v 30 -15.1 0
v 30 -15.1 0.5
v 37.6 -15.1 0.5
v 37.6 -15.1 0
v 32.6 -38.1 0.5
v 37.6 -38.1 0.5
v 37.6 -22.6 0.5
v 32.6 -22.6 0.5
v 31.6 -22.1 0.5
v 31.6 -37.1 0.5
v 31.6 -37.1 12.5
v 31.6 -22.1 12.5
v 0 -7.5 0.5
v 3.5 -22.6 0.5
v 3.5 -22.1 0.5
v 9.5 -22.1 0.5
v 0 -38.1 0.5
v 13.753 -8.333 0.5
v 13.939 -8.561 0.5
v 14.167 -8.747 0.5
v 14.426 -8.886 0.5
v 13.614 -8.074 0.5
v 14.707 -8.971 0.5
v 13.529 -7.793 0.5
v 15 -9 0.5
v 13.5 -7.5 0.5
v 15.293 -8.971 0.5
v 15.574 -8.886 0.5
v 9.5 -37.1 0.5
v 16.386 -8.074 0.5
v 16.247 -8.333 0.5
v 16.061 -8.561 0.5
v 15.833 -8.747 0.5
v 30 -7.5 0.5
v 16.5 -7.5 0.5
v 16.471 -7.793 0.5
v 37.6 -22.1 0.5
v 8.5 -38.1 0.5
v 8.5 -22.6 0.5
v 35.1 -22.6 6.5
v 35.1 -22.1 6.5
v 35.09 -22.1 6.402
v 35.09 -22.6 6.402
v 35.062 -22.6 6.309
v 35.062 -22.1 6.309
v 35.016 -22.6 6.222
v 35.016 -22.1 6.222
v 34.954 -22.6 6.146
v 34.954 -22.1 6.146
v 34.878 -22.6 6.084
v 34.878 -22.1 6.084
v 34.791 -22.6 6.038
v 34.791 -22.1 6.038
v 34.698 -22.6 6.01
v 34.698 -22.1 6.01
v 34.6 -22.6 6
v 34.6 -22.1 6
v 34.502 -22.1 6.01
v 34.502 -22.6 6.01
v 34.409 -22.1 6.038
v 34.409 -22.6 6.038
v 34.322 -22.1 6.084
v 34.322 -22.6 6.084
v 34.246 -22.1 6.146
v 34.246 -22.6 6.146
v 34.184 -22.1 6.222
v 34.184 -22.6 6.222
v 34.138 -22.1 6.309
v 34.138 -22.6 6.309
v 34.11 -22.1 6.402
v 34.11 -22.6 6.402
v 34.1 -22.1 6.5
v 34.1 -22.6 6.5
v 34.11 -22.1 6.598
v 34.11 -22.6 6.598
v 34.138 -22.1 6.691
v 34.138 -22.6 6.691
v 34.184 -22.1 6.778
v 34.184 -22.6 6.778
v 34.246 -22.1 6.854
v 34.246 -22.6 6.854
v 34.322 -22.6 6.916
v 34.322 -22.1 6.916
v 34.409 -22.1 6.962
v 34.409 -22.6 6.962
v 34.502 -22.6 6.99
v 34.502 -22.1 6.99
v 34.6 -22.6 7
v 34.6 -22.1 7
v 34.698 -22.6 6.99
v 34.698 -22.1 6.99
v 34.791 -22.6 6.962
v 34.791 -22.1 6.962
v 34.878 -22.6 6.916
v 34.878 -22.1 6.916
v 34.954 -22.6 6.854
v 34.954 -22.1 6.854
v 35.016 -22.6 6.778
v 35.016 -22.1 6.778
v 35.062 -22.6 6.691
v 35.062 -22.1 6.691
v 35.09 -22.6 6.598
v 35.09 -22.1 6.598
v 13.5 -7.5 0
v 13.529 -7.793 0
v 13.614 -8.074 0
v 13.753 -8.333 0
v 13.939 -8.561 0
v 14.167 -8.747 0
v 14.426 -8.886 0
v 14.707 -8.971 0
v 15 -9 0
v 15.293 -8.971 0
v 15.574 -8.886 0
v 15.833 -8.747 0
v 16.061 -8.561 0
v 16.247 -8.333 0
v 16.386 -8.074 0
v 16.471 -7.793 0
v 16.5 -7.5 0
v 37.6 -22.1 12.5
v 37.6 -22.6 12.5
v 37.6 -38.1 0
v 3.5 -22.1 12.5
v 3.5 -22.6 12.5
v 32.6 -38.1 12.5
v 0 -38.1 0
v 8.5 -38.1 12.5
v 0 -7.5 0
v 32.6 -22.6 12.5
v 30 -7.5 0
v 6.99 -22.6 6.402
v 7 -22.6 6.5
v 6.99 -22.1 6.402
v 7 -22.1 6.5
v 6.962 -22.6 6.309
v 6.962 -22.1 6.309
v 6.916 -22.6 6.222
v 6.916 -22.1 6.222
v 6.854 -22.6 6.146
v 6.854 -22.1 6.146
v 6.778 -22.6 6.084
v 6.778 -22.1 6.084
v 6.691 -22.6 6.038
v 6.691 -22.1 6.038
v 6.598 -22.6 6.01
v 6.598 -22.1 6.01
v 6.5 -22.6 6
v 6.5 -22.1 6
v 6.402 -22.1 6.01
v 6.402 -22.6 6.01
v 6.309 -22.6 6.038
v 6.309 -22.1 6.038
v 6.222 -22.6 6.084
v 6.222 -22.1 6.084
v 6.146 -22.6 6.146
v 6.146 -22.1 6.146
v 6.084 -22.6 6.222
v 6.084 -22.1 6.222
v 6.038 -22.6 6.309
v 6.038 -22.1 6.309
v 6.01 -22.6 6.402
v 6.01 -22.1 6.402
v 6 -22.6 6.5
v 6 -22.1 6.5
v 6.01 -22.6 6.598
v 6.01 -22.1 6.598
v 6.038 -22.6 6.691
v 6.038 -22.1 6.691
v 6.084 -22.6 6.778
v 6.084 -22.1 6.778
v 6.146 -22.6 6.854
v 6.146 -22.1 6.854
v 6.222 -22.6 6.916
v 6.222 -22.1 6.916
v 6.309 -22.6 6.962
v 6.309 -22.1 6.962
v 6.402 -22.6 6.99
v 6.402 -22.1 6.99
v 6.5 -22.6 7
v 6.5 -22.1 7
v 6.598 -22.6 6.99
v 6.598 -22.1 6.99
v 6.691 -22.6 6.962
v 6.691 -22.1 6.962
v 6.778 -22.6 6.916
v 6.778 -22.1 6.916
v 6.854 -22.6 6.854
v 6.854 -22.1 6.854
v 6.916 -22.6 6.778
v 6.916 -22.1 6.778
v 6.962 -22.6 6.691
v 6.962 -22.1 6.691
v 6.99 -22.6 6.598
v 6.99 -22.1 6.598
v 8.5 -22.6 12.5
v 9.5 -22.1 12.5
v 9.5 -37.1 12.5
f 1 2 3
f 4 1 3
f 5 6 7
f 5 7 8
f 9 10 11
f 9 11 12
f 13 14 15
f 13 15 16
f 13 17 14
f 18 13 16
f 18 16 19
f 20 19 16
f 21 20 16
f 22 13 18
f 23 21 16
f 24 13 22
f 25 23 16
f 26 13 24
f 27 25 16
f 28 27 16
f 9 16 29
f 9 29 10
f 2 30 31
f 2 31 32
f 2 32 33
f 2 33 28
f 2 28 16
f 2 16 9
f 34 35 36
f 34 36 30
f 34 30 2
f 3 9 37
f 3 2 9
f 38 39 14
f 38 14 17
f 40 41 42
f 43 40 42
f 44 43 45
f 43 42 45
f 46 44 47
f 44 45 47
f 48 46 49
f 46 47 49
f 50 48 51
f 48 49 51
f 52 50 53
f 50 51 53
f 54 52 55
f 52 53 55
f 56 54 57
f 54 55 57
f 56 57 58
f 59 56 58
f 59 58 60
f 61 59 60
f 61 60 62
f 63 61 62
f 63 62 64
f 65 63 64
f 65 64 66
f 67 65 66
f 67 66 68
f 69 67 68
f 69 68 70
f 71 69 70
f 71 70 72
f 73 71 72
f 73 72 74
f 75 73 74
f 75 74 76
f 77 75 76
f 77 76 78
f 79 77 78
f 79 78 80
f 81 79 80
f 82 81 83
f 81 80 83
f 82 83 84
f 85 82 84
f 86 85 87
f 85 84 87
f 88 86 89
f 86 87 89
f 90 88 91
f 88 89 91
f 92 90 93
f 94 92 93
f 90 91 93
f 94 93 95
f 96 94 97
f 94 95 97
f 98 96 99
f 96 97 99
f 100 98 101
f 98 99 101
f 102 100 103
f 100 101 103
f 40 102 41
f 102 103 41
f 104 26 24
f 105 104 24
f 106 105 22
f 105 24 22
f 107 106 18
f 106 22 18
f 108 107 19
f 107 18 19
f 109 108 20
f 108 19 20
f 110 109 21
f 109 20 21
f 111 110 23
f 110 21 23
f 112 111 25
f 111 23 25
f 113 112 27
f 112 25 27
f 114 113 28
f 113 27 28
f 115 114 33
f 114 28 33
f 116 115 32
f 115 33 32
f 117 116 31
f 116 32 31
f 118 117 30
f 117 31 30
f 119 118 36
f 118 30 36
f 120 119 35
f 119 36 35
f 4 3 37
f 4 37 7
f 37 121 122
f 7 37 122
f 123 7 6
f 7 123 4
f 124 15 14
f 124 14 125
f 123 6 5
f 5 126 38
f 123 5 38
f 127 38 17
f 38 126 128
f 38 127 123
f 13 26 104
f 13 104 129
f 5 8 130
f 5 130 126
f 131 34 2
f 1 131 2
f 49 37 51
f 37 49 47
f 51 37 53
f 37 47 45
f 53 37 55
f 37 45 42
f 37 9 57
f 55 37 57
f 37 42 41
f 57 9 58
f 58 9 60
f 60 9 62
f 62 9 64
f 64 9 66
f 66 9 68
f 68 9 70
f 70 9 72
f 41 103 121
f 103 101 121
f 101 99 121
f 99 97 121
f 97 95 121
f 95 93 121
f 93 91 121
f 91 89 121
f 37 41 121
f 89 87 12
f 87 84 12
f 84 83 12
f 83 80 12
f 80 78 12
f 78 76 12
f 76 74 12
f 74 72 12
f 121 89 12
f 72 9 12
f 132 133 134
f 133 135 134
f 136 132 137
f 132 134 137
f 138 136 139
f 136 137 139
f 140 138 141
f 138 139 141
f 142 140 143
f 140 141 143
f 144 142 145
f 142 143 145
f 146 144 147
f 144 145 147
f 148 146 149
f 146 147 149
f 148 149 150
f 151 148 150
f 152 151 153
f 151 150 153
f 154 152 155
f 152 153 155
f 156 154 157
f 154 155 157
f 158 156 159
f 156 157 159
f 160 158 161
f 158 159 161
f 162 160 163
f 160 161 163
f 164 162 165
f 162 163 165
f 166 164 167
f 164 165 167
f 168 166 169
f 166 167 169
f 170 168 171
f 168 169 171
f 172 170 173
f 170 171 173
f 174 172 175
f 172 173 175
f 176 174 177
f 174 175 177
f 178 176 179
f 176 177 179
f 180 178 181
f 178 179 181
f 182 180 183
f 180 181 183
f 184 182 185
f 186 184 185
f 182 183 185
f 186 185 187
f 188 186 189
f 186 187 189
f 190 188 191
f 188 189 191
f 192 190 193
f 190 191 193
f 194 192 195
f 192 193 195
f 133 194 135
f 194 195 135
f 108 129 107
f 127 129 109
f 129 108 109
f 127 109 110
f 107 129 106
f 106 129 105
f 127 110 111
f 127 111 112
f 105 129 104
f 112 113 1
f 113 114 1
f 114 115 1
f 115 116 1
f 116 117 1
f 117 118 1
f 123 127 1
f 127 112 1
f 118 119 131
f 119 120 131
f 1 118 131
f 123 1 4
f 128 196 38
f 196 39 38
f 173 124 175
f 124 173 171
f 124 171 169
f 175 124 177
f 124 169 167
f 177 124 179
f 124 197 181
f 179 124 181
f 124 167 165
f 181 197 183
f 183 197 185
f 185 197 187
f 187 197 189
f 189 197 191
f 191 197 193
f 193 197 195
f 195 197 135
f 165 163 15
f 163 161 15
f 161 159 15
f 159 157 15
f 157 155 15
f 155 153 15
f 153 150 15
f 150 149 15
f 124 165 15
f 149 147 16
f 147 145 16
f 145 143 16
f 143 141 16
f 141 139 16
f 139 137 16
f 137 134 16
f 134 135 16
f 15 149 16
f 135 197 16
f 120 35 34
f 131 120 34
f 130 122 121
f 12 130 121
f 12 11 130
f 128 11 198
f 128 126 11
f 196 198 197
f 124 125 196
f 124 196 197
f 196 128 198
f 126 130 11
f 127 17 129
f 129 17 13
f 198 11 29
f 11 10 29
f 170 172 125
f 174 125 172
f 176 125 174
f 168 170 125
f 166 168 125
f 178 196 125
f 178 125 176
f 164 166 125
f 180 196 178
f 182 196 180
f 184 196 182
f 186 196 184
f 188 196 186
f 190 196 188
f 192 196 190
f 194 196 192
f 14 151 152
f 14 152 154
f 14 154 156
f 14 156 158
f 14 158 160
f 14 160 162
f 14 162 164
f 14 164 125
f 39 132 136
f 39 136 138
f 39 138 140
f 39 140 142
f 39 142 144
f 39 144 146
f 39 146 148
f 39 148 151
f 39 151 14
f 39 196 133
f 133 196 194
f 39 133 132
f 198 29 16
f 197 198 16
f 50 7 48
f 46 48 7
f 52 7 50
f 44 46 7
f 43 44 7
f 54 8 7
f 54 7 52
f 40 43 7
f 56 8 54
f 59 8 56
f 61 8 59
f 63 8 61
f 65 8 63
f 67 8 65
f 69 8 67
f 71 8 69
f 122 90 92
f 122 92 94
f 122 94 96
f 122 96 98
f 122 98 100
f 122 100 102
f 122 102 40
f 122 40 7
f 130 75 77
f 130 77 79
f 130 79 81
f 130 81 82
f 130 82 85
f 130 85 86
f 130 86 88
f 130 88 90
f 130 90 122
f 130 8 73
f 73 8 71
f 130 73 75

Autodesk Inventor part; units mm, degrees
ref_plane "YZ Plane" through (0, 0, 0) normal (1, 0, 0) x (0, 1, 0)
ref_plane "XZ Plane" through (0, 0, 0) normal (0, 1, 0) x (-1, 0, 0)
ref_plane "XY Plane" through (0, 0, 0) normal (0, 0, 1) x (1, 0, 0)
sketch "Esboço1" plane through (0, 0, 0) normal (0, 0, 1) x (1, 0, 0)
  line L0 (0, 0) -> (30, 0)
  line L1 (30, 0) -> (30, -36.4)
  line L2 (30, -36.4) -> (0, -36.4)
  line L3 (0, -36.4) -> (0, 0)
  dimension "d0" = 30
  dimension "d1" = 36.4
extrude "Extrusão1" add sketch "Esboço1" along normal blind 0.5
sketch "Esboço2" plane through (0, 0, 0.5) normal (0, 0, 1) x (1, 0, 0)
  line L0 (30, 0) -> (0, 0) projected
  line L1 (0, 0) -> (15, 0)
  line L2 (15, 0) -> (15, -7.5)
  circle A0 centre (15, -7.5) radius 1.5
  dimension "d4" = 7.5
  dimension "d5" = 3
extrude "Extrusão2" cut sketch "Esboço2" against normal blind 0.5
sketch "Esboço4" plane through (0, 0, 0.5) normal (0, 0, 1) x (1, 0, 0)
  line L0 (0, -36.4) -> (30, -36.4) projected
  line L1 (0, -36.4) -> (30, -36.4)
  line L2 (30, -36.4) -> (30, -37.1)
  line L3 (30, -37.1) -> (0, -37.1)
  line L4 (0, -37.1) -> (0, -36.4)
  point P0 (0, 0)
  dimension "d10" = 0.7
extrude "Extrusão3" add sketch "Esboço4" against normal blind 0.5
sketch "Esboço5" plane through (0, 0, 0.5) normal (0, 0, 1) x (1, 0, 0)
  line L0 (0, 0) -> (0, -37.1) projected
  line L1 (0, -37.1) -> (4, -37.1)
  line L2 (30, -37.1) -> (0, -37.1) projected
  line L3 (30, -37.1) -> (30, 0) projected
  line L4 (30, -37.1) -> (26, -37.1)
  line L5 (30, -37.1) -> (35.5, -37.1)
  line L6 (35.5, -37.1) -> (35.5, -17.1)
  line L7 (35.5, -17.1) -> (30, -17.1)
  dimension "d13" = 4
  dimension "d14" = 4
  dimension "d15" = 5.5
  dimension "d16" = 20
extrude "Extrusão4" add sketch "Esboço5" against normal blind 0.5
sketch "Esboço6" plane through (0, 0, 0.5) normal (0, 0, 1) x (1, 0, 0)
  line L0 (35.5, -37.1) -> (0, -37.1) projected
  line L1 (0, -37.1) -> (9.5, -37.1)
  line L2 (35.5, -37.1) -> (31.6, -37.1)
  line L3 (35.5, -37.1) -> (36.5, -37.1)
  line L4 (36.5, -37.1) -> (36.5, -11.1125)
  line L5 (36.5, -11.1125) -> (35.5, -11.1125)
  line L6 (35.5, -11.1125) -> (35.5, -37.1)
  line L7 (30, -17.1) -> (30, 0) projected
  line L8 (30, -17.1) -> (30, -15.0997)
  line L9 (30, -15.0997) -> (36.5, -15.0997)
  line L10 (30, -17.1) -> (35.5, -17.1) projected
  line L11 (30, -17.1) -> (35.5, -17.1)
  line L12 (30, -15.0997) -> (36.5, -15.0997)
  point P0 (0, 0)
  dimension "d19" = 9.5
  dimension "d20" = 3.9
  dimension "d21" = 1
extrude "Extrusão5" add sketch "Esboço6" against normal blind 0.5 contours L6 L9 L4 L3 | L10 L7 L9 L6
sketch "Esboço7" plane through (0, 0, 0.5) normal (0, 0, 1) x (1, 0, 0)
  line L0 (36.5, -37.1) -> (0, -37.1) projected
  line L1 (0, -37.1) -> (9.5, -37.1)
  line L2 (36.5, -37.1) -> (31.6, -37.1)
  line L3 (31.6, -37.1) -> (31.6, -20.6)
  line L4 (9.5, -37.1) -> (9.5, -20.6)
  line L5 (8.5, -20.6) -> (8.5, -37.1)
  line L6 (32.6, -20.6) -> (32.6, -37.1)
  line L7 (31.6, -20.6) -> (31.6, -20.1)
  line L8 (31.6, -20.1) -> (32.6, -20.1)
  line L9 (32.6, -20.1) -> (32.6, -20.6375)
  line L10 (9.5, -20.6) -> (9.5, -20.1)
  line L11 (9.5, -20.1) -> (8.5, -20.1)
  line L12 (8.5, -20.1) -> (8.5, -20.8548)
  line L13 (8.5, -37.1) -> (32.6, -37.1)
  line L14 (32.6, -37.1) -> (32.6, -36.6)
  line L15 (8.5, -37.1) -> (8.5, -36.6)
  point P0 (0, 0)
  dimension "d24" = 9.5
  dimension "d25" = 4.9
  dimension "d26" = 16.5
  dimension "d27" = 1
  dimension "d28" = 1
  dimension "d29" = 0.5
  dimension "d30" = 0.5
  dimension "d31" = 0.5
extrude "Extrusão6" add sketch "Esboço7" along normal blind 12
sketch "Esboço8" plane through (0, 0, 0.5) normal (0, 0, 1) x (1, 0, 0)
  line L0 (0, 0) -> (0, -37.1) projected
  line L1 (0, -37.1) -> (36.5125, -37.1)
  line L2 (36.5125, -37.1) -> (36.5125, -38.1)
  line L3 (36.5125, -38.1) -> (0, -38.1)
  line L4 (0, -38.1) -> (0, -37.1)
extrude "Extrusão7" add sketch "Esboço8" against normal blind 0.5
sketch "Esboço9" plane through (0, 0, 0.5) normal (0, 0, 1) x (1, 0, 0)
  line L0 (8.5, -37.1) -> (9.5, -37.1) projected
  line L1 (8.5, -37.1) -> (8.5, -38.1)
  line L2 (8.5, -38.1) -> (32.6, -38.1)
  line L3 (0, -38.1) -> (36.5125, -38.1) projected
  line L4 (31.6, -37.1) -> (32.6, -37.1) projected
  line L5 (32.6, -37.1) -> (32.6, -38.1)
  line L6 (32.6165, -37.1) -> (8.5, -37.1)
  point P0 (0, 0)
extrude "Extrusão8" add sketch "Esboço9" along normal blind 12
sketch "Esboço10" plane through (0, 0, 12.5) normal (0, 0, 1) x (1, 0, 0)
  line L0 (9.5, -20.1) -> (8.5, -20.1) projected
  line L1 (9.5, -37.1) -> (9.5, -20.1) projected
  line L2 (8.5, -20.1) -> (9.5, -20.1)
  line L3 (9.5, -20.1) -> (9.5, -22.1)
  line L4 (9.5, -22.1) -> (8.5, -22.1)
  line L5 (8.5, -22.1) -> (8.5, -20.1)
  line L6 (32.6, -20.1) -> (31.6, -20.1) projected
  line L7 (32.6, -38.1) -> (32.6, -20.1) projected
  line L8 (31.6, -20.1) -> (32.6, -20.1)
  line L9 (32.6, -20.1) -> (32.6, -22.1)
  line L10 (32.6, -22.1) -> (31.6, -22.1)
  line L11 (31.6, -22.1) -> (31.6, -20.1)
  point P0 (0, 0)
  dimension "d38" = 2
extrude "Extrusão9" cut sketch "Esboço10" against normal blind 12
sketch "Esboço11" plane through (8.5, -38.1, 0.5) normal (-1, 0, 0) x (0, 0, 1)
  line L0 (12, 16) -> (0, 16) projected
  line L1 (12, 16) -> (12, 0) projected
  line L2 (0, 16) -> (12, 16)
  line L3 (12, 16) -> (12, 15.5)
  line L4 (12, 15.5) -> (0, 15.5)
  line L5 (0, 15.5) -> (0, 16)
  point P0 (-0.5, 38.1)
  dimension "d41" = 0.5
extrude "Extrusão10" add sketch "Esboço11" along normal blind 5
sketch "Esboço12" plane through (32.6, -38.1, 12.5) normal (1, 0, 0) x (0, 0, -1)
  line L0 (12, 16) -> (0, 16) projected
  line L1 (12, 15.5) -> (0, 15.5) projected
  line L2 (0, 16) -> (12, 16)
  line L3 (12, 16) -> (12, 15.5)
  line L4 (12, 15.5) -> (0, 15.5)
  line L5 (0, 15.5) -> (0, 16)
  point P0 (12.5, 38.1)
extrude "Extrusão11" add sketch "Esboço12" along normal blind 5
sketch "Esboço13" plane through (0, 0, 0.5) normal (0, 0, 1) x (1, 0, 0)
  circle A0 centre (15, -7.5) radius 1.5 projected
  line L0 (15, -7.5) -> (30, -7.5)
  line L1 (30, -15.0997) -> (30, 0) projected
  line L2 (15, -7.5) -> (0, -7.5)
  line L3 (0, -38.1) -> (0, 0) projected
  line L4 (0, 0) -> (30, 0)
  line L5 (30, 0) -> (0, 0) projected
  line L6 (30, 0) -> (30, -7.5)
  line L7 (0, -7.5) -> (0, 0)
  point P0 (13.5, -7.5)
  point P1 (16.5, -7.5)
extrude "Extrusão12" cut sketch "Esboço13" against normal blind 5 contours A0 L2 L3 L4 L1 L0
sketch "Esboço14" plane through (31.6, -22.1, 12.5) normal (0, 1, 0) x (1, 0, 0)
  line L0 (-22.1, 0) -> (-28.1, 0) projected
  line L1 (-28.1, 0) -> (-25.1, 0)
  line L2 (-25.1, 0) -> (-25.1, 6)
  line L3 (-22.1, 12) -> (-28.1, 12) projected
  line L4 (6, 12) -> (6, 0) projected
  line L5 (6, 0) -> (3, 0)
  line L6 (6, 0) -> (0, 0) projected
  line L7 (3, 0) -> (3, 6)
  circle A0 centre (-25.1, 6) radius 0.5
  circle A1 centre (3, 6) radius 0.5
  point P0 (-31.6, 12.5)
  dimension "d48" = 6
  dimension "d49" = 1
  dimension "d50" = 1
extrude "Extrusão13" cut sketch "Esboço14" against normal blind 5
sketch "Esboço15" plane through (37.6, -22.1, 0.5) normal (0, 0, -1) x (-1, 0, 0)
  line L0 (7.6, 7.0003) -> (1.1, 7.0003) projected
  line L1 (1.1, 7.0003) -> (0, 7.0003)
  line L2 (0, 7.0003) -> (0, -16)
  line L3 (1.0875, -15) -> (1.0875, -16) projected
  line L4 (0, -16) -> (1.0875, -16)
  line L5 (1.1, 7.0003) -> (1.8775, 7.0003)
  line L6 (1.8775, 7.0003) -> (1.8775, -16)
  line L7 (1.0875, -16) -> (37.6, -16) projected
  line L8 (0, -16) -> (1.8775, -16)
  point P0 (37.6, 22.1)
extrude "Extrusão14" add sketch "Esboço15" along normal blind 0.5
properties part number "tampa"
